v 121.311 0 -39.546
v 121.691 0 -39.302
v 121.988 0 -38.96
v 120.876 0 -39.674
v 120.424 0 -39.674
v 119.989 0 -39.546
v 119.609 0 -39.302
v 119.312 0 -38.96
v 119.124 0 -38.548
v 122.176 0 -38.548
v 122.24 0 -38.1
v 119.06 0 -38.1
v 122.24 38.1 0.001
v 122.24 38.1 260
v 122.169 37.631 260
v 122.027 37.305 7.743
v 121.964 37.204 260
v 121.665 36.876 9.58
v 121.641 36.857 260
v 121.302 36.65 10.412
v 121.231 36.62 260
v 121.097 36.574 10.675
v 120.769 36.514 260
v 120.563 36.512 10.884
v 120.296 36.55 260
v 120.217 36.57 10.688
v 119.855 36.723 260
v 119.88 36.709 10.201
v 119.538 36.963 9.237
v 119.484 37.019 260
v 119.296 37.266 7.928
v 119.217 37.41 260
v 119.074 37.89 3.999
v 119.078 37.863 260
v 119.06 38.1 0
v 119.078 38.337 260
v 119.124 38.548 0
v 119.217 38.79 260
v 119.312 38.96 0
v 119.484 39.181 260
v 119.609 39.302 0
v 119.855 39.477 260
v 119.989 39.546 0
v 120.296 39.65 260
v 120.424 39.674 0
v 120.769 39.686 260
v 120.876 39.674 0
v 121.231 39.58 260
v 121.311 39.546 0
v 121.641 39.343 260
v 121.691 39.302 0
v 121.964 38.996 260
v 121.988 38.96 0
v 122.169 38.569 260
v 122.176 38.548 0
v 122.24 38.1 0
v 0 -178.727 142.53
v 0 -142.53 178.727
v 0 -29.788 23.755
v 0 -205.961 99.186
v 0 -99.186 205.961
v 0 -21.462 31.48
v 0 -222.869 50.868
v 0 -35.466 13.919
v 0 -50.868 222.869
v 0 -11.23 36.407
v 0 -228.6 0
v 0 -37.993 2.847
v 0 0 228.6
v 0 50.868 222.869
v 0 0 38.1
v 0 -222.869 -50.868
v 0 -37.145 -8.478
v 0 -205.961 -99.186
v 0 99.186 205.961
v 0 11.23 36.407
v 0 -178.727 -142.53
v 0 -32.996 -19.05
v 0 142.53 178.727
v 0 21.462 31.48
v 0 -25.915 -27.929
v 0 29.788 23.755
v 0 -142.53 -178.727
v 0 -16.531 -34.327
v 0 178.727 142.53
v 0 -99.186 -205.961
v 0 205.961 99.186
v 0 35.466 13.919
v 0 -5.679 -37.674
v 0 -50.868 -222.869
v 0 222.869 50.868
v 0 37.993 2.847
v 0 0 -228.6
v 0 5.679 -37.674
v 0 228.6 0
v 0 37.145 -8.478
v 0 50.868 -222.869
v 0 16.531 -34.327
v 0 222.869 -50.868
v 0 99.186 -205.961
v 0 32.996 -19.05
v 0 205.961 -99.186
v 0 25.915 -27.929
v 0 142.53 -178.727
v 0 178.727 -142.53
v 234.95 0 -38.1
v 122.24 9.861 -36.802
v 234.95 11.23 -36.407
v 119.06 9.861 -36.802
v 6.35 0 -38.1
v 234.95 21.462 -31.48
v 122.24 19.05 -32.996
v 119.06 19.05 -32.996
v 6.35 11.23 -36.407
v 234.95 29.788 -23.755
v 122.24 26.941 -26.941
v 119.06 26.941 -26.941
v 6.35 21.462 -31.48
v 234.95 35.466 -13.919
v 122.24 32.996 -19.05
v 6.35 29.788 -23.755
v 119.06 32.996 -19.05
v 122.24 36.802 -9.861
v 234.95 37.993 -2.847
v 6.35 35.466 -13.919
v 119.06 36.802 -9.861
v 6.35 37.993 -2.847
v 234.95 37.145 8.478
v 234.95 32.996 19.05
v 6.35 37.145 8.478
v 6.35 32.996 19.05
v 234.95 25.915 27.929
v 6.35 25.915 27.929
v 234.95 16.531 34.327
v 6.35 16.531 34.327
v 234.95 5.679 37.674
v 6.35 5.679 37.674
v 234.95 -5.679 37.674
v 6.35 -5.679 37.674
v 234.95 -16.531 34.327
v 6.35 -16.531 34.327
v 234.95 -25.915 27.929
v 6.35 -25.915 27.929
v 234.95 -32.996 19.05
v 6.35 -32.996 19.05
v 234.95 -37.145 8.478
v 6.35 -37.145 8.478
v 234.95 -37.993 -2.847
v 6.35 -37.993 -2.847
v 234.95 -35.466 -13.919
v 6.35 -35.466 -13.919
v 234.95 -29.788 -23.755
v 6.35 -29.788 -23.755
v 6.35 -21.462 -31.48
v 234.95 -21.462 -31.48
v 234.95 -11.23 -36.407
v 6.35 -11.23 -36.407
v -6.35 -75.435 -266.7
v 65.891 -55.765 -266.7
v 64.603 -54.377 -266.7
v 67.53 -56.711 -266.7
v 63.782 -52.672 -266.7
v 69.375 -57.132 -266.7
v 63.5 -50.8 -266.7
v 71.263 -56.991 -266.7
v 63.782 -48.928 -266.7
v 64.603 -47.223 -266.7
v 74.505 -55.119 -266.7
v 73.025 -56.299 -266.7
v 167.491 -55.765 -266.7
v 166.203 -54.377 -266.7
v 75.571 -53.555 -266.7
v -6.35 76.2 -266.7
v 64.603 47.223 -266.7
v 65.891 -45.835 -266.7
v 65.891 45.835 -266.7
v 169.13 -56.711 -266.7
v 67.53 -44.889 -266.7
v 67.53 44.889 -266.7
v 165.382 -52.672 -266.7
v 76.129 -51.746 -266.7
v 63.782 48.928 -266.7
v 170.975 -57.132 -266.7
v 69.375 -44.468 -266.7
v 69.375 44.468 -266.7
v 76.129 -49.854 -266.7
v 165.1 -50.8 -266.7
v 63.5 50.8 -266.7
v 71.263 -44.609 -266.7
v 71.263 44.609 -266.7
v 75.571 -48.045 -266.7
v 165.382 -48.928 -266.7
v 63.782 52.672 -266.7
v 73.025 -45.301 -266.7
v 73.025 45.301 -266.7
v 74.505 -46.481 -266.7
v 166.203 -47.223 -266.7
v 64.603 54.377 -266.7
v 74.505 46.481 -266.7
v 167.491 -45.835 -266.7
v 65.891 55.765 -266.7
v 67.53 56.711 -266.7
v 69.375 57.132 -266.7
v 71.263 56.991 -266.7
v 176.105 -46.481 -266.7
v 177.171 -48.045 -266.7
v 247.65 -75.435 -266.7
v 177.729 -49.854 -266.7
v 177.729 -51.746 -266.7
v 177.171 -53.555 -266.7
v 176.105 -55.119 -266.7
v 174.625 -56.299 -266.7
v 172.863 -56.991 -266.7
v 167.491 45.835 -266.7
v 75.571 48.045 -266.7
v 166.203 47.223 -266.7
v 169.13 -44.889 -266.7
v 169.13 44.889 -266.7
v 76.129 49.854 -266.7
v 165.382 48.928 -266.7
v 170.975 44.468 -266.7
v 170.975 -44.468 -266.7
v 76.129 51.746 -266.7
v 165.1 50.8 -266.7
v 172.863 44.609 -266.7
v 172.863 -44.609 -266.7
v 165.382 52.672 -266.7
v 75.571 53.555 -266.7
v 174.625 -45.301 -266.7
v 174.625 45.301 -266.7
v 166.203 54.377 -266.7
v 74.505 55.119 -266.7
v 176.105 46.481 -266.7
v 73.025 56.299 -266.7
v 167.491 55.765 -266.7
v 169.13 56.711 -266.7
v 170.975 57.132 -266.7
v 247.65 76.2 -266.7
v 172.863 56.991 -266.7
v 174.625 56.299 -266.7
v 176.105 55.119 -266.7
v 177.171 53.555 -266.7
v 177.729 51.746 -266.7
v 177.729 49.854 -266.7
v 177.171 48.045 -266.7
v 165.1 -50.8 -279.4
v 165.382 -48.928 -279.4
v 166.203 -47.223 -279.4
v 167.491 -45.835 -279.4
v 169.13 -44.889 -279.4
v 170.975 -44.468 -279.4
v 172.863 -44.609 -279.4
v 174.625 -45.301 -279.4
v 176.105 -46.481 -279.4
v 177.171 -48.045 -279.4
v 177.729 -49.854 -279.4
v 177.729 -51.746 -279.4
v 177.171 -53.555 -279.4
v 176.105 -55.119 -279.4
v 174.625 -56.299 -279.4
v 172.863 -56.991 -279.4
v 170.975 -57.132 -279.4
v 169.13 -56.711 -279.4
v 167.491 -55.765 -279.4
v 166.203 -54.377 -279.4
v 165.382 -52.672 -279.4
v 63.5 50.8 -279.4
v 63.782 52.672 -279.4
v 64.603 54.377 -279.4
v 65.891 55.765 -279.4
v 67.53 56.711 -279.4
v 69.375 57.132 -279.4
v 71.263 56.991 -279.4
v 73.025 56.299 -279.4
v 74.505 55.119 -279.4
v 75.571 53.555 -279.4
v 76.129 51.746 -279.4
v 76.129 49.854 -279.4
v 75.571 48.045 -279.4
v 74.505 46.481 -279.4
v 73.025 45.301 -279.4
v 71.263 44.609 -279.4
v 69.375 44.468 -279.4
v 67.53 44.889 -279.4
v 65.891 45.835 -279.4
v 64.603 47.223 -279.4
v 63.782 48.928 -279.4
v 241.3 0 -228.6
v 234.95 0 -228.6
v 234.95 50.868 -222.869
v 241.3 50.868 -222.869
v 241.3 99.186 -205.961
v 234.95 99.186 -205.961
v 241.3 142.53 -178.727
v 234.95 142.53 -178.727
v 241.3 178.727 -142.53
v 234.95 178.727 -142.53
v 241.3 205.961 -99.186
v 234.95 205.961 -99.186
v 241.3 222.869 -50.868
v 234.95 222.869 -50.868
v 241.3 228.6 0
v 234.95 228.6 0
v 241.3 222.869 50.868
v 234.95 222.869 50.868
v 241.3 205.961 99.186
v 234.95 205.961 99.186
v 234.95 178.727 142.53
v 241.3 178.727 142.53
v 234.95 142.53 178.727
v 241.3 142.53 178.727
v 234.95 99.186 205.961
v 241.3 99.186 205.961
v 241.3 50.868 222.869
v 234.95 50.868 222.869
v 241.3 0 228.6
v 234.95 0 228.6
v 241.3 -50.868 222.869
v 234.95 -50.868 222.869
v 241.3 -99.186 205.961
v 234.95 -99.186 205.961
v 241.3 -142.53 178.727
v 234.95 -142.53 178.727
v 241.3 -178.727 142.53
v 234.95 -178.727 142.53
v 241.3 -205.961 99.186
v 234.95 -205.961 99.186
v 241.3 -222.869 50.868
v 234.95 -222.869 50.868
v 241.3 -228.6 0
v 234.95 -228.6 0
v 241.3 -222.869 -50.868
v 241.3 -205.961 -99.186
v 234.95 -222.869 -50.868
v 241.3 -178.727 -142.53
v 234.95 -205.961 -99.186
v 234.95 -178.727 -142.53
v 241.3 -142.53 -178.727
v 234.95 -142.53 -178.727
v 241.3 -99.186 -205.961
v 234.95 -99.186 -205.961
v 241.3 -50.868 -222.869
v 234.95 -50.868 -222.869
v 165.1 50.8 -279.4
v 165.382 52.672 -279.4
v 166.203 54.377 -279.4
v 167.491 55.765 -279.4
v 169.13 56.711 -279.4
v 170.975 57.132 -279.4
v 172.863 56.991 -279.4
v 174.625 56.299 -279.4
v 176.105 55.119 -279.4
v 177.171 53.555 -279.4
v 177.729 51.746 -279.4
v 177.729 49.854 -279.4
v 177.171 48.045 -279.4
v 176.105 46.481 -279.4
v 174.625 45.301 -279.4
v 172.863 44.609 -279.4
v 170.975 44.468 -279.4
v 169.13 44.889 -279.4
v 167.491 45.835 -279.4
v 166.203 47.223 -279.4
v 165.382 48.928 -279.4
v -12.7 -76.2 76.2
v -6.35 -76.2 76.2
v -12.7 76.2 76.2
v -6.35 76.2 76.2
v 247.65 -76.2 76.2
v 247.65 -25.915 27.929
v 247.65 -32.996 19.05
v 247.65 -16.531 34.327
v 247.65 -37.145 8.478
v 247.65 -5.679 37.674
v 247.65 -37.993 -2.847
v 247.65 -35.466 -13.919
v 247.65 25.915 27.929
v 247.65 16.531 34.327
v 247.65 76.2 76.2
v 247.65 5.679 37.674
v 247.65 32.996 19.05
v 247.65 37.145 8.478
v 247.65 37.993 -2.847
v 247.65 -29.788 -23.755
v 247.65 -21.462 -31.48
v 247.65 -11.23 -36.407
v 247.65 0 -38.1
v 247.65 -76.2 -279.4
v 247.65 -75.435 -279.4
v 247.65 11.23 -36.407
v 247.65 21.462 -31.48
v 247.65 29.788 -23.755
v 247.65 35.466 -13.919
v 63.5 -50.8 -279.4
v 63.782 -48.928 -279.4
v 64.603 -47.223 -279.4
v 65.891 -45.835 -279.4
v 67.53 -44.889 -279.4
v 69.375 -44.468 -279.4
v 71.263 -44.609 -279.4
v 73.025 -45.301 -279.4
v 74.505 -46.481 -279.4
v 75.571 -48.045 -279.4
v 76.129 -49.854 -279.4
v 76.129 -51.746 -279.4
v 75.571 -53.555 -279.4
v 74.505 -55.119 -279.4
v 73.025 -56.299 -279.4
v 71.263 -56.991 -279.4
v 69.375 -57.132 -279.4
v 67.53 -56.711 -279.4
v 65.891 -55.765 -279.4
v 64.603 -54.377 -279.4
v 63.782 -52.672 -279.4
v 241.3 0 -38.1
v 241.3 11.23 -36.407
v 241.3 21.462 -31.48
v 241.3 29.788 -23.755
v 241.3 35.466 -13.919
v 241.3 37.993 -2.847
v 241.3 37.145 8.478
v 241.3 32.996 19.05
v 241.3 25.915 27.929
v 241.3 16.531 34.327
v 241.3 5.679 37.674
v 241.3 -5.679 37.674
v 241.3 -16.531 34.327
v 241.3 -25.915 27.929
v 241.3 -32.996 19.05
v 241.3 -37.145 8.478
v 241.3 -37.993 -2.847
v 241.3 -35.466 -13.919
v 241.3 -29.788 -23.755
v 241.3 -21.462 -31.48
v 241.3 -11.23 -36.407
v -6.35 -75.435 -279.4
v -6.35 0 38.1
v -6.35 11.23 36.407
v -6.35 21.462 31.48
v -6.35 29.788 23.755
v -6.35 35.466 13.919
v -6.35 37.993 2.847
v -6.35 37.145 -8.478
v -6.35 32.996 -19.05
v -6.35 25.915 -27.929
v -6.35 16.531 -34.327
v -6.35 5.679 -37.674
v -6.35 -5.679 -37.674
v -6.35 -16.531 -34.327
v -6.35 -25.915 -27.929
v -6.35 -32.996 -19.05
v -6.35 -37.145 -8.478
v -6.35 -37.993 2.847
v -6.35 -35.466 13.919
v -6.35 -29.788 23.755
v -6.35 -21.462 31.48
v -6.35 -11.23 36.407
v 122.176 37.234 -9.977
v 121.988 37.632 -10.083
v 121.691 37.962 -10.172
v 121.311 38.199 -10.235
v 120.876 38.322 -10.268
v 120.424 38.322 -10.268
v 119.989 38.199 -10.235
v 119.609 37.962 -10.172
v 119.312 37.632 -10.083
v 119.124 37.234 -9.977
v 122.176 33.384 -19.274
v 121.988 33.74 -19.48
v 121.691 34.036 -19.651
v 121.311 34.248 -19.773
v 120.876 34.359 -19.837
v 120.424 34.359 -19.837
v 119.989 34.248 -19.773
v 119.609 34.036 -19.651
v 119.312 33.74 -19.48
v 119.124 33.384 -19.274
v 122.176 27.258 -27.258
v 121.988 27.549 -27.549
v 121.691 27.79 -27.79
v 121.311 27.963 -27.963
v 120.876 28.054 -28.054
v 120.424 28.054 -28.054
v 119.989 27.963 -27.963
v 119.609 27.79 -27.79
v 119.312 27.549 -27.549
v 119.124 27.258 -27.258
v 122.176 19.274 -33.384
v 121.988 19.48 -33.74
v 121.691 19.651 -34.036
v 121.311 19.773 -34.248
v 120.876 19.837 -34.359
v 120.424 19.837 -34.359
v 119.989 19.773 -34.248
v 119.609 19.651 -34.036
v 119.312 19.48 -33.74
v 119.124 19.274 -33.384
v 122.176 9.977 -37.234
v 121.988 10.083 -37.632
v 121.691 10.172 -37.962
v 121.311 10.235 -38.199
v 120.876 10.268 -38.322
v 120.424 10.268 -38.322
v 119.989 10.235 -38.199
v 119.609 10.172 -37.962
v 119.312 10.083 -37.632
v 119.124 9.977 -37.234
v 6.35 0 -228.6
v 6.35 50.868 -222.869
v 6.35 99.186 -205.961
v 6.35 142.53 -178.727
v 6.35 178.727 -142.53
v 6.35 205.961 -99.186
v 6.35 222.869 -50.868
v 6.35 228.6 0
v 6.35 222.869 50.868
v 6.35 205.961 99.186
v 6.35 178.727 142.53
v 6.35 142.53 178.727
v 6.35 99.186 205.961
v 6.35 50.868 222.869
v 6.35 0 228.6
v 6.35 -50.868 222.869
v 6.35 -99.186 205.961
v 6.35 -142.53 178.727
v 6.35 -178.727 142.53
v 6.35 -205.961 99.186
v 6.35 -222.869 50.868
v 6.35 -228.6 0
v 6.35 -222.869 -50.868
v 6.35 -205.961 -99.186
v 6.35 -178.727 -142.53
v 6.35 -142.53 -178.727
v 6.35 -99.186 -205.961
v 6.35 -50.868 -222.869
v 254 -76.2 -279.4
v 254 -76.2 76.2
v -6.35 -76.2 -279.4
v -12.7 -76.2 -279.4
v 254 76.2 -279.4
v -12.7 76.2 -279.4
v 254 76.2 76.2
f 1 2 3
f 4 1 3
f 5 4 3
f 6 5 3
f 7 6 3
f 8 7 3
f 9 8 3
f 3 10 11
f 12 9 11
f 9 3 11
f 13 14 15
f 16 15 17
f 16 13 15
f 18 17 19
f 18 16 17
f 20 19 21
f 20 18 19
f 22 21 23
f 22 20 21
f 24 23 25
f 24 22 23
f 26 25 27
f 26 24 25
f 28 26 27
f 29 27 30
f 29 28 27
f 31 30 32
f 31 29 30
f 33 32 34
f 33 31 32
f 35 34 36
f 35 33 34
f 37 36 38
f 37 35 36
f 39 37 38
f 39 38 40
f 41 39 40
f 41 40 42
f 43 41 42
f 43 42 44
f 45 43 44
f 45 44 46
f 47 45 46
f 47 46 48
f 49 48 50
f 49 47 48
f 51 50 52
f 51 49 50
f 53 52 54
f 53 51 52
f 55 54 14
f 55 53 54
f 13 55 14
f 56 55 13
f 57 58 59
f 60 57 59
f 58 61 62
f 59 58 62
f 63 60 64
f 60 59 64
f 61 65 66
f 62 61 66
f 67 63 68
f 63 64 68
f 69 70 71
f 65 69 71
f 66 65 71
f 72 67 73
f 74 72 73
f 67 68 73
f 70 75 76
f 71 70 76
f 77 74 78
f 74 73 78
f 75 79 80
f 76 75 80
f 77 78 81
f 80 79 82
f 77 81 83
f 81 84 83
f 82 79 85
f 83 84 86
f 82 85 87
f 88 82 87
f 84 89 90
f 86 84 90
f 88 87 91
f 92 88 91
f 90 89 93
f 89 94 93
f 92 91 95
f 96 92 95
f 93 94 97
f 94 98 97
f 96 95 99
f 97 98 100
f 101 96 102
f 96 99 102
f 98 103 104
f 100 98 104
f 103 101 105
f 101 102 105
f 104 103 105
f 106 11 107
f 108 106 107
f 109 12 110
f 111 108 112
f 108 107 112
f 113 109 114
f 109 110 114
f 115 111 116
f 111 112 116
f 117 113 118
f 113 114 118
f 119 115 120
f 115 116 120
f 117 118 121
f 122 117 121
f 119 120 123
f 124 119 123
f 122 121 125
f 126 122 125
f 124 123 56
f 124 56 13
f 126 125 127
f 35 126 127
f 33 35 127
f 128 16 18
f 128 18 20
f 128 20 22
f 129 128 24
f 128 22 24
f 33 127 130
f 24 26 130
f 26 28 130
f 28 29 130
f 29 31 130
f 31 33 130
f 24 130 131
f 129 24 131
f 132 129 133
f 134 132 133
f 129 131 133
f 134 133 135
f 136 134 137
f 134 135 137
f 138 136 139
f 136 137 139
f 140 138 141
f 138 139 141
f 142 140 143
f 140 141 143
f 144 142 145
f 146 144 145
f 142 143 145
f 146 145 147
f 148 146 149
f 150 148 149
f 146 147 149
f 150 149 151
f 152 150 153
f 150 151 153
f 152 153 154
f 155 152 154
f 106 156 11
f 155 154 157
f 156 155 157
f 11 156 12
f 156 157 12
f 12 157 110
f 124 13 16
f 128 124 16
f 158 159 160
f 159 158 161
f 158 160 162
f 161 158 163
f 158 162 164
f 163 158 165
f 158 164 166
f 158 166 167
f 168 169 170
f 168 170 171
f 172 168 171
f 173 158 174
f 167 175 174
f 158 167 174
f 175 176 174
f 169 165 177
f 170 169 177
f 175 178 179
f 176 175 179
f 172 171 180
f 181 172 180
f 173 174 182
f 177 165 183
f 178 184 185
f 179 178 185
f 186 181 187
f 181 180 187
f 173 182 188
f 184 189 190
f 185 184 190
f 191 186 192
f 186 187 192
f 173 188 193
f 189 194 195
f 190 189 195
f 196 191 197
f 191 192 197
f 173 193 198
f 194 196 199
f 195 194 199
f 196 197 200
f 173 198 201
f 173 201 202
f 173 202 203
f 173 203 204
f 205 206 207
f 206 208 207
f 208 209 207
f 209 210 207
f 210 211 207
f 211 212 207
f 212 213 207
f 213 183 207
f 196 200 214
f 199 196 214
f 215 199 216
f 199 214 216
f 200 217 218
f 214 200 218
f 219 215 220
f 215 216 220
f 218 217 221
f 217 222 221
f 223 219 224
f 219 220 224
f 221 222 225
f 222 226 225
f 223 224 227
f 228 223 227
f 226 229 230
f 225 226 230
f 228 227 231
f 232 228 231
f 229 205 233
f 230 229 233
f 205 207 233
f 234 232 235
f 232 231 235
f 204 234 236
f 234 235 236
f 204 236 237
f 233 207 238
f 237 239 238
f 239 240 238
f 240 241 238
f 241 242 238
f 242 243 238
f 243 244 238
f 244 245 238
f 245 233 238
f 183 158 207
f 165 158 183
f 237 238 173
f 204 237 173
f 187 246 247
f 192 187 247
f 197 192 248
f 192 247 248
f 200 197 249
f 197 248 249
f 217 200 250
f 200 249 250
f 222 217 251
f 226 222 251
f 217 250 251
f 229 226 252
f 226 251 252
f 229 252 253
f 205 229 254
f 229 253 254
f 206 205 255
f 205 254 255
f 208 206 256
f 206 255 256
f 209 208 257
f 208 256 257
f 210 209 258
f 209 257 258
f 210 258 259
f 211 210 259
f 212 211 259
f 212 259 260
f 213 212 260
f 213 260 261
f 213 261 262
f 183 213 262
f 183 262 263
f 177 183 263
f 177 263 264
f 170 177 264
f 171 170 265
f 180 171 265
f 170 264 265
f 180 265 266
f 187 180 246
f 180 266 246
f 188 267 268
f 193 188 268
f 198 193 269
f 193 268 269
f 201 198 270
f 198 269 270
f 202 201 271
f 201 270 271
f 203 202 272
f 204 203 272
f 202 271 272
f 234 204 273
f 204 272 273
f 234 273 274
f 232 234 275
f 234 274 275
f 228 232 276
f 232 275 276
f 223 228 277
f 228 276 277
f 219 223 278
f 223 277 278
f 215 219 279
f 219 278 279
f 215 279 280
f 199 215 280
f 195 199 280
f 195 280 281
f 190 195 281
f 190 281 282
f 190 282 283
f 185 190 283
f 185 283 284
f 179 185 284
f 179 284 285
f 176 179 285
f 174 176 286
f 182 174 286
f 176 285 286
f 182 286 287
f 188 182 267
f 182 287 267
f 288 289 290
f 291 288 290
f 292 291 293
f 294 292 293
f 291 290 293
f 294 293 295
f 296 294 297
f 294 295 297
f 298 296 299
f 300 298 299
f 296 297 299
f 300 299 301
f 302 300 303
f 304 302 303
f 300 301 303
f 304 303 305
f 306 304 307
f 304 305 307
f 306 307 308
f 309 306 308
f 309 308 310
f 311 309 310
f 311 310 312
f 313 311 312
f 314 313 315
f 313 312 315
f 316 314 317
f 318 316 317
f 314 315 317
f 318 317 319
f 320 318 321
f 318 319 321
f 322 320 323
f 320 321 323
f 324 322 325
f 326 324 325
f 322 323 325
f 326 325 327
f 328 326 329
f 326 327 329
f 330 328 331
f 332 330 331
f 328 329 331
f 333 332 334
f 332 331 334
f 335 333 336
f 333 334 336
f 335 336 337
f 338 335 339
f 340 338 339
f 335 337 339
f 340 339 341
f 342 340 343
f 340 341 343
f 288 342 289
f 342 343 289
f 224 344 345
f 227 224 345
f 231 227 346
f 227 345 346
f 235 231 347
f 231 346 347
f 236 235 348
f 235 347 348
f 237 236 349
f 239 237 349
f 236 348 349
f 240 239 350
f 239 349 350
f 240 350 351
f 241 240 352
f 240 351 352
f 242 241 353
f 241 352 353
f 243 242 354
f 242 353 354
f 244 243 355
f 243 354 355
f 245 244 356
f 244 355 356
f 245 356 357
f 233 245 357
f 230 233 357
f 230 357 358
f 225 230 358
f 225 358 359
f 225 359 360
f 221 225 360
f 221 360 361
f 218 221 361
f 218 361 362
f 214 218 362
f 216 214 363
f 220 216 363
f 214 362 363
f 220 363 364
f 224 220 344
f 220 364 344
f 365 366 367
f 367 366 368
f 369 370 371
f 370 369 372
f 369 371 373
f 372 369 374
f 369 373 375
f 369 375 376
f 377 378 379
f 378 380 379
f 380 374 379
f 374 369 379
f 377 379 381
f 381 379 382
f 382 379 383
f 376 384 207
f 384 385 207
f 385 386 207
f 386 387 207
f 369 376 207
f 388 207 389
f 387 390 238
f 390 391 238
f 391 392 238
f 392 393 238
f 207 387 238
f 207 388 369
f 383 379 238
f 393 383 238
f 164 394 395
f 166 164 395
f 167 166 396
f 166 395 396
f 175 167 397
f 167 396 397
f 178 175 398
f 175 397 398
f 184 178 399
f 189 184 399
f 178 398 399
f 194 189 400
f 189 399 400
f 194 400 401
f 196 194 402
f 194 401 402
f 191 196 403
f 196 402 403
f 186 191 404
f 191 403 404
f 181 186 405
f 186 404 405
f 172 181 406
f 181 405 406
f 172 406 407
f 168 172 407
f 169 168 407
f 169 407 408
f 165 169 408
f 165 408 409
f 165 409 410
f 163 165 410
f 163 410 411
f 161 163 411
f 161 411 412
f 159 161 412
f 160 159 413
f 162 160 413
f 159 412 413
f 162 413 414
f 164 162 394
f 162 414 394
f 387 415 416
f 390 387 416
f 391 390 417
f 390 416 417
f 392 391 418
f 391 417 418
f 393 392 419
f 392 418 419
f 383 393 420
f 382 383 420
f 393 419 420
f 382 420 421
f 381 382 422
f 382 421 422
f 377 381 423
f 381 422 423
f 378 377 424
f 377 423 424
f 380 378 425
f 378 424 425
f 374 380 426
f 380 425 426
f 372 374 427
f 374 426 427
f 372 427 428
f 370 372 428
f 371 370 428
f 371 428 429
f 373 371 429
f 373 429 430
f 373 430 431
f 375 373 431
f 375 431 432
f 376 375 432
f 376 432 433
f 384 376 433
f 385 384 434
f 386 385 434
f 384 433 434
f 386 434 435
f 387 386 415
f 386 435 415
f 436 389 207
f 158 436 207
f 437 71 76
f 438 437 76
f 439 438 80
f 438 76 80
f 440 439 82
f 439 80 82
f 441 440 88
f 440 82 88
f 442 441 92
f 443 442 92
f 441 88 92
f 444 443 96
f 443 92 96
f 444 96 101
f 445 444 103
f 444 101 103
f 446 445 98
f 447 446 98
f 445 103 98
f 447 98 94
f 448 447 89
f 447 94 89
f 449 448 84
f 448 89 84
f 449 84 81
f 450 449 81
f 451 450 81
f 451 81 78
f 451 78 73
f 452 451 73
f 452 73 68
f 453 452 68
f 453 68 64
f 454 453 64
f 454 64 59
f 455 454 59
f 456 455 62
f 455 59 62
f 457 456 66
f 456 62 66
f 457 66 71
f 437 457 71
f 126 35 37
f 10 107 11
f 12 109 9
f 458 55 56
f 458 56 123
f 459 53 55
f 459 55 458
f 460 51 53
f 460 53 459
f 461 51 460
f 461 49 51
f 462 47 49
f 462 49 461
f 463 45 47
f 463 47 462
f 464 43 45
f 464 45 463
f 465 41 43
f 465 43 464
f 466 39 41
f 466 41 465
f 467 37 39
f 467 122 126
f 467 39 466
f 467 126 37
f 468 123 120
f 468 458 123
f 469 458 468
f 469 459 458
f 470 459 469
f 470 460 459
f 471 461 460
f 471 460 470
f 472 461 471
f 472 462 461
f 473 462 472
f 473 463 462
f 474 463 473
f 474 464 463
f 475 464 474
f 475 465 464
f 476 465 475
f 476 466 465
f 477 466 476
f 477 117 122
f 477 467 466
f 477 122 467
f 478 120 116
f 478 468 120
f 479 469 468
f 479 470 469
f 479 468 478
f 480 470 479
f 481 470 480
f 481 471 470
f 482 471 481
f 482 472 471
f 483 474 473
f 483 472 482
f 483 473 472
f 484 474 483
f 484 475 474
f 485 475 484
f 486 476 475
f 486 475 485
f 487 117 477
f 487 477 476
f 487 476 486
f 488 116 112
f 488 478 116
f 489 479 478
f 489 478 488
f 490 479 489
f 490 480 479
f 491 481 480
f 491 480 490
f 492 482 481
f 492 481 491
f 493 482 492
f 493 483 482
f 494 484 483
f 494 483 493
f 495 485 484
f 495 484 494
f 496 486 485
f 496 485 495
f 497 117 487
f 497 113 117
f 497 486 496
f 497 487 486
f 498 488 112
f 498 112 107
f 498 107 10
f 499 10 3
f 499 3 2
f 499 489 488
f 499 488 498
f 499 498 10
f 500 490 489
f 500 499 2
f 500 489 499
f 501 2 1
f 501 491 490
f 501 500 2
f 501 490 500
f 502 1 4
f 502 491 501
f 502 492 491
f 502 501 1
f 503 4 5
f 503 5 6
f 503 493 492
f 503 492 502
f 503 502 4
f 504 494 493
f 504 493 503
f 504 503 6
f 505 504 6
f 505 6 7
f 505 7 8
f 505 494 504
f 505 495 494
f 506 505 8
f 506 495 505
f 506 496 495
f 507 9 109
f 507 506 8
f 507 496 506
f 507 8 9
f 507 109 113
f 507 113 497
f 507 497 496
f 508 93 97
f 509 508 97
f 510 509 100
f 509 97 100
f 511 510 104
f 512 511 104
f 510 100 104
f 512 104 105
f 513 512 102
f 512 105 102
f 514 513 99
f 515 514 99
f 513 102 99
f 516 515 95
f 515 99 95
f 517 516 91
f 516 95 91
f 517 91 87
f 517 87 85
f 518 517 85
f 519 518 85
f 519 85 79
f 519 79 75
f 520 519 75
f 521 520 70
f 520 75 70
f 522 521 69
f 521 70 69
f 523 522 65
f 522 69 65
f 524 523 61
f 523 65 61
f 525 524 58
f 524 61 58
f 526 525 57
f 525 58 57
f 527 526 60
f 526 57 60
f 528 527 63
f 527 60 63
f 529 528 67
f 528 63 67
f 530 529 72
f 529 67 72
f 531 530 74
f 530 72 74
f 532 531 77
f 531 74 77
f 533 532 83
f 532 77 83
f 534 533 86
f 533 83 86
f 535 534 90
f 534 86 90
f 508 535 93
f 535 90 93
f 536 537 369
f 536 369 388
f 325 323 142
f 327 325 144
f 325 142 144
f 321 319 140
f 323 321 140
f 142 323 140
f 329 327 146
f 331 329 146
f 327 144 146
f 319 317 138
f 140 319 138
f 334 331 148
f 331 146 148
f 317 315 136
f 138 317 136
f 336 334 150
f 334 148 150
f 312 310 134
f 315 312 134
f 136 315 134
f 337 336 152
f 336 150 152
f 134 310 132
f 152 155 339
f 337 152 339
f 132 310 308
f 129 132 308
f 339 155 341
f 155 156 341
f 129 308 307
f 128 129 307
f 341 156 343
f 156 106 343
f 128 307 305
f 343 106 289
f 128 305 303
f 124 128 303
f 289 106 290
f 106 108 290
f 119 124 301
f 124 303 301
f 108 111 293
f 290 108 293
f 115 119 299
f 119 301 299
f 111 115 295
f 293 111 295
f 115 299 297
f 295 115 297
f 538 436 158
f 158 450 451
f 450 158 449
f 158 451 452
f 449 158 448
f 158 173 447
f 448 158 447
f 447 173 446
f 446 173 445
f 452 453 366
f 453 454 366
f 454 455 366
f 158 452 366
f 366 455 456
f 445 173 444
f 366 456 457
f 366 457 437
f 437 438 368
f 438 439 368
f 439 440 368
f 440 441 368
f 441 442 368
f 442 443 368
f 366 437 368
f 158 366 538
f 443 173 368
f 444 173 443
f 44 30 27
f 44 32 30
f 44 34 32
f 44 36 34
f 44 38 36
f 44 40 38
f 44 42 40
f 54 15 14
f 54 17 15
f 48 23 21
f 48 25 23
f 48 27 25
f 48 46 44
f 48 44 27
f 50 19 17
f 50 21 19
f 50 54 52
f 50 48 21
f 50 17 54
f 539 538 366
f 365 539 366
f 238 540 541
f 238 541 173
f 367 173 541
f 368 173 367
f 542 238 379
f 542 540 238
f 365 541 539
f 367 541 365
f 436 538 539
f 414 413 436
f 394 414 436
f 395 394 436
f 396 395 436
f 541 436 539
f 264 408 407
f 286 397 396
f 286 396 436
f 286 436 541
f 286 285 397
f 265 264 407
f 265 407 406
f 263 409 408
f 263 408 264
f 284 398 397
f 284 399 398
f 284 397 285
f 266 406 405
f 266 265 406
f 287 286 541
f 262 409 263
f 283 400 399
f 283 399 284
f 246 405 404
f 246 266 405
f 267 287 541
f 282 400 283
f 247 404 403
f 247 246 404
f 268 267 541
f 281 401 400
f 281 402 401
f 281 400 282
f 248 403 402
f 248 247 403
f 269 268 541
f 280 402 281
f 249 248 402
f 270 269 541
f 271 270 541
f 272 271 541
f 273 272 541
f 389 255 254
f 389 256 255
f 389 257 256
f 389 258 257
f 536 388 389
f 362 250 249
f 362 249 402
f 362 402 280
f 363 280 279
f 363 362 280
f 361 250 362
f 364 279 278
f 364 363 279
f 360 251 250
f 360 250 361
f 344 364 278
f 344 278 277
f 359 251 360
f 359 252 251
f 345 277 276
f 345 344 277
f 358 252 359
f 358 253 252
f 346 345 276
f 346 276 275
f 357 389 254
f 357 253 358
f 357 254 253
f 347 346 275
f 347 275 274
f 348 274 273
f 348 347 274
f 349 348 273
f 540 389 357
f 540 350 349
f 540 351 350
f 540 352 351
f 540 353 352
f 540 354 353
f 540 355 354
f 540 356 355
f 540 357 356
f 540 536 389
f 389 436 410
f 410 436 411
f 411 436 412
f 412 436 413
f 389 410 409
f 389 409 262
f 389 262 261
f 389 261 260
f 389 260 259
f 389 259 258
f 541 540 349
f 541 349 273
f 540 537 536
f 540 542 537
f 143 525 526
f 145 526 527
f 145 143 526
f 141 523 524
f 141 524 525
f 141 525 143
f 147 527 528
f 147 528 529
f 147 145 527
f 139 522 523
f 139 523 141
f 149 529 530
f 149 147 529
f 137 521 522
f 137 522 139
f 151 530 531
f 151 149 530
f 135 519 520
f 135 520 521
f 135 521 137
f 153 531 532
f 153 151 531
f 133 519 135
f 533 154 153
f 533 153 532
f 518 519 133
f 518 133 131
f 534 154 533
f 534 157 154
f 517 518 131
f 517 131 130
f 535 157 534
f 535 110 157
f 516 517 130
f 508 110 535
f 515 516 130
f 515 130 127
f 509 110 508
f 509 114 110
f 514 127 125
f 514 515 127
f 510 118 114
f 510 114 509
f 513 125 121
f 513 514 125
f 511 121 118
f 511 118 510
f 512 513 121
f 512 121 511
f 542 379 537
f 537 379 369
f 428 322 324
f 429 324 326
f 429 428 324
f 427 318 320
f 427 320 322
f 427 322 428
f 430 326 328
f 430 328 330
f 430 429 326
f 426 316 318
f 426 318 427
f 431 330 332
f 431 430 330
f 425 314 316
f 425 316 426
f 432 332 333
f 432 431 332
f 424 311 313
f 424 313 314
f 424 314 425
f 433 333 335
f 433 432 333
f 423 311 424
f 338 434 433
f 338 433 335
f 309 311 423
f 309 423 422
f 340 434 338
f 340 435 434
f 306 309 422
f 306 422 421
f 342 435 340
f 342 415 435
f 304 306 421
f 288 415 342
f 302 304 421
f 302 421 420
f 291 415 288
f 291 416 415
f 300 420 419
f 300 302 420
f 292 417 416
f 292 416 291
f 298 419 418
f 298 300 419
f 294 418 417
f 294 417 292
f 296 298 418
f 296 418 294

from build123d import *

# Parameters (mm, degrees)
SKETCH1_R           = 228.6
BOSS_EXTRUDE1_DEPTH = 6.35
SKETCH2_R           = 38.1
BOSS_EXTRUDE2_DEPTH = 228.6
SKETCH3_R           = 228.6
BOSS_EXTRUDE3_DEPTH = 6.35
SKETCH4_R           = 38.1
BOSS_EXTRUDE4_DEPTH = 6.35
SKETCH5_R           = 38.1
BOSS_EXTRUDE5_DEPTH = 6.35
BOSS_EXTRUDE6_DEPTH = 6.35
SKETCH7_W           = 203.2
SKETCH7_H           = 152.4
BOSS_EXTRUDE7_DEPTH = 6.35
BOSS_EXTRUDE8_DEPTH = 6.35
SKETCH9_W           = 12.7
SKETCH9_H           = 151.635108104
BOSS_EXTRUDE9_DEPTH = 254
SKETCH10_R          = 6.35
CUT_EXTRUDE1_DEPTH  = 12.7
SKETCH13_R          = 1.59


with BuildPart() as part:
    # Sketch1 → Boss-Extrude1 (new body)
    with BuildSketch(Plane(origin=(0, 0, 0), x_dir=(0, 0, -1), z_dir=(1, 0, 0))):
        Circle(SKETCH1_R)
    extrude(amount=BOSS_EXTRUDE1_DEPTH)

    # Sketch2 → Boss-Extrude2 (add)
    with BuildSketch(Plane(origin=(6.35, 0, 0), x_dir=(0, 0, -1), z_dir=(1, 0, 0))):
        Circle(SKETCH2_R)
    extrude(amount=BOSS_EXTRUDE2_DEPTH)

    # Sketch3 → Boss-Extrude3 (add)
    with BuildSketch(Plane(origin=(234.95, 0, 0), x_dir=(0, 0, -1), z_dir=(1, 0, 0))):
        Circle(SKETCH3_R)
    extrude(amount=BOSS_EXTRUDE3_DEPTH)

    # Sketch4 → Boss-Extrude4 (add)
    with BuildSketch(Plane(origin=(241.3, 0, 0), x_dir=(0, 0, -1), z_dir=(1, 0, 0))):
        Circle(SKETCH4_R)
    extrude(amount=BOSS_EXTRUDE4_DEPTH)

    # Sketch5 → Boss-Extrude5 (add)
    with BuildSketch(Plane.ZY):
        Circle(SKETCH5_R)
    extrude(amount=BOSS_EXTRUDE5_DEPTH)

    # Sketch6 → Boss-Extrude6 (add)
    with BuildSketch(Plane(origin=(247.65, 0, 0), x_dir=(0, 0, -1), z_dir=(1, 0, 0))):
        Polygon((-76.2, -76.2), (-76.2, 0), (-76.2, 76.2), (-5.028509112, 76.2), (76.2, 76.2), (76.2, -76.2), align=None)
    extrude(amount=BOSS_EXTRUDE6_DEPTH)

    # Sketch7 → Boss-Extrude7 (add)
    with BuildSketch(Plane(origin=(254, 0, 0), x_dir=(0, 0, -1), z_dir=(1, 0, 0))):
        with Locations((177.8, 0)):
            Rectangle(SKETCH7_W, SKETCH7_H)
    extrude(amount=-BOSS_EXTRUDE7_DEPTH)

    # Sketch8 → Boss-Extrude8 (add)
    with BuildSketch(Plane.ZY.offset(6.35)):
        Polygon((-76.2, -76.2), (76.2, -76.2), (76.2, 76.2), (-76.2, 76.2), (-279.4, 76.2), (-279.4, -76.2), align=None)
    extrude(amount=BOSS_EXTRUDE8_DEPTH)

    # Sketch9 → Boss-Extrude9 (add)
    with BuildSketch(Plane.ZY.offset(-247.65)):
        with Locations((-273.05, 0.382445948)):
            Rectangle(SKETCH9_W, SKETCH9_H)
    extrude(amount=BOSS_EXTRUDE9_DEPTH)

    # Sketch10 → Cut-Extrude1 (cut)
    with BuildSketch(Plane(origin=(0, 0, -279.4), x_dir=(-1, 0, 0), z_dir=(0, 0, -1))):
        with Locations((-171.45, 50.8)):
            Circle(SKETCH10_R)
        with Locations((-69.85, 50.8)):
            Circle(SKETCH10_R)
        with Locations((-69.85, -50.8)):
            Circle(SKETCH10_R)
        with Locations((-171.45, -50.8)):
            Circle(SKETCH10_R)
    extrude(amount=-CUT_EXTRUDE1_DEPTH, mode=Mode.SUBTRACT)

    # Sweep1: sweep along a path in Sketch12
    with BuildLine(Plane.ZY.offset(-120.65)) as sweep1_path:
        Line((260, 38.1), (0, 38.1))
        ThreePointArc((0, 38.1), (-26.940768363, 26.940768363), (-38.1, 0))
    # Sketch13 → Sweep1 (sweep)
    with BuildSketch(Plane(origin=(0, 0, 0), x_dir=(1, 0, 0), z_dir=(0, 1, 0))):
        with Locations((120.65, 38.1)):
            Circle(SKETCH13_R)
    sweep(path=sweep1_path.line)


solid = part.part
